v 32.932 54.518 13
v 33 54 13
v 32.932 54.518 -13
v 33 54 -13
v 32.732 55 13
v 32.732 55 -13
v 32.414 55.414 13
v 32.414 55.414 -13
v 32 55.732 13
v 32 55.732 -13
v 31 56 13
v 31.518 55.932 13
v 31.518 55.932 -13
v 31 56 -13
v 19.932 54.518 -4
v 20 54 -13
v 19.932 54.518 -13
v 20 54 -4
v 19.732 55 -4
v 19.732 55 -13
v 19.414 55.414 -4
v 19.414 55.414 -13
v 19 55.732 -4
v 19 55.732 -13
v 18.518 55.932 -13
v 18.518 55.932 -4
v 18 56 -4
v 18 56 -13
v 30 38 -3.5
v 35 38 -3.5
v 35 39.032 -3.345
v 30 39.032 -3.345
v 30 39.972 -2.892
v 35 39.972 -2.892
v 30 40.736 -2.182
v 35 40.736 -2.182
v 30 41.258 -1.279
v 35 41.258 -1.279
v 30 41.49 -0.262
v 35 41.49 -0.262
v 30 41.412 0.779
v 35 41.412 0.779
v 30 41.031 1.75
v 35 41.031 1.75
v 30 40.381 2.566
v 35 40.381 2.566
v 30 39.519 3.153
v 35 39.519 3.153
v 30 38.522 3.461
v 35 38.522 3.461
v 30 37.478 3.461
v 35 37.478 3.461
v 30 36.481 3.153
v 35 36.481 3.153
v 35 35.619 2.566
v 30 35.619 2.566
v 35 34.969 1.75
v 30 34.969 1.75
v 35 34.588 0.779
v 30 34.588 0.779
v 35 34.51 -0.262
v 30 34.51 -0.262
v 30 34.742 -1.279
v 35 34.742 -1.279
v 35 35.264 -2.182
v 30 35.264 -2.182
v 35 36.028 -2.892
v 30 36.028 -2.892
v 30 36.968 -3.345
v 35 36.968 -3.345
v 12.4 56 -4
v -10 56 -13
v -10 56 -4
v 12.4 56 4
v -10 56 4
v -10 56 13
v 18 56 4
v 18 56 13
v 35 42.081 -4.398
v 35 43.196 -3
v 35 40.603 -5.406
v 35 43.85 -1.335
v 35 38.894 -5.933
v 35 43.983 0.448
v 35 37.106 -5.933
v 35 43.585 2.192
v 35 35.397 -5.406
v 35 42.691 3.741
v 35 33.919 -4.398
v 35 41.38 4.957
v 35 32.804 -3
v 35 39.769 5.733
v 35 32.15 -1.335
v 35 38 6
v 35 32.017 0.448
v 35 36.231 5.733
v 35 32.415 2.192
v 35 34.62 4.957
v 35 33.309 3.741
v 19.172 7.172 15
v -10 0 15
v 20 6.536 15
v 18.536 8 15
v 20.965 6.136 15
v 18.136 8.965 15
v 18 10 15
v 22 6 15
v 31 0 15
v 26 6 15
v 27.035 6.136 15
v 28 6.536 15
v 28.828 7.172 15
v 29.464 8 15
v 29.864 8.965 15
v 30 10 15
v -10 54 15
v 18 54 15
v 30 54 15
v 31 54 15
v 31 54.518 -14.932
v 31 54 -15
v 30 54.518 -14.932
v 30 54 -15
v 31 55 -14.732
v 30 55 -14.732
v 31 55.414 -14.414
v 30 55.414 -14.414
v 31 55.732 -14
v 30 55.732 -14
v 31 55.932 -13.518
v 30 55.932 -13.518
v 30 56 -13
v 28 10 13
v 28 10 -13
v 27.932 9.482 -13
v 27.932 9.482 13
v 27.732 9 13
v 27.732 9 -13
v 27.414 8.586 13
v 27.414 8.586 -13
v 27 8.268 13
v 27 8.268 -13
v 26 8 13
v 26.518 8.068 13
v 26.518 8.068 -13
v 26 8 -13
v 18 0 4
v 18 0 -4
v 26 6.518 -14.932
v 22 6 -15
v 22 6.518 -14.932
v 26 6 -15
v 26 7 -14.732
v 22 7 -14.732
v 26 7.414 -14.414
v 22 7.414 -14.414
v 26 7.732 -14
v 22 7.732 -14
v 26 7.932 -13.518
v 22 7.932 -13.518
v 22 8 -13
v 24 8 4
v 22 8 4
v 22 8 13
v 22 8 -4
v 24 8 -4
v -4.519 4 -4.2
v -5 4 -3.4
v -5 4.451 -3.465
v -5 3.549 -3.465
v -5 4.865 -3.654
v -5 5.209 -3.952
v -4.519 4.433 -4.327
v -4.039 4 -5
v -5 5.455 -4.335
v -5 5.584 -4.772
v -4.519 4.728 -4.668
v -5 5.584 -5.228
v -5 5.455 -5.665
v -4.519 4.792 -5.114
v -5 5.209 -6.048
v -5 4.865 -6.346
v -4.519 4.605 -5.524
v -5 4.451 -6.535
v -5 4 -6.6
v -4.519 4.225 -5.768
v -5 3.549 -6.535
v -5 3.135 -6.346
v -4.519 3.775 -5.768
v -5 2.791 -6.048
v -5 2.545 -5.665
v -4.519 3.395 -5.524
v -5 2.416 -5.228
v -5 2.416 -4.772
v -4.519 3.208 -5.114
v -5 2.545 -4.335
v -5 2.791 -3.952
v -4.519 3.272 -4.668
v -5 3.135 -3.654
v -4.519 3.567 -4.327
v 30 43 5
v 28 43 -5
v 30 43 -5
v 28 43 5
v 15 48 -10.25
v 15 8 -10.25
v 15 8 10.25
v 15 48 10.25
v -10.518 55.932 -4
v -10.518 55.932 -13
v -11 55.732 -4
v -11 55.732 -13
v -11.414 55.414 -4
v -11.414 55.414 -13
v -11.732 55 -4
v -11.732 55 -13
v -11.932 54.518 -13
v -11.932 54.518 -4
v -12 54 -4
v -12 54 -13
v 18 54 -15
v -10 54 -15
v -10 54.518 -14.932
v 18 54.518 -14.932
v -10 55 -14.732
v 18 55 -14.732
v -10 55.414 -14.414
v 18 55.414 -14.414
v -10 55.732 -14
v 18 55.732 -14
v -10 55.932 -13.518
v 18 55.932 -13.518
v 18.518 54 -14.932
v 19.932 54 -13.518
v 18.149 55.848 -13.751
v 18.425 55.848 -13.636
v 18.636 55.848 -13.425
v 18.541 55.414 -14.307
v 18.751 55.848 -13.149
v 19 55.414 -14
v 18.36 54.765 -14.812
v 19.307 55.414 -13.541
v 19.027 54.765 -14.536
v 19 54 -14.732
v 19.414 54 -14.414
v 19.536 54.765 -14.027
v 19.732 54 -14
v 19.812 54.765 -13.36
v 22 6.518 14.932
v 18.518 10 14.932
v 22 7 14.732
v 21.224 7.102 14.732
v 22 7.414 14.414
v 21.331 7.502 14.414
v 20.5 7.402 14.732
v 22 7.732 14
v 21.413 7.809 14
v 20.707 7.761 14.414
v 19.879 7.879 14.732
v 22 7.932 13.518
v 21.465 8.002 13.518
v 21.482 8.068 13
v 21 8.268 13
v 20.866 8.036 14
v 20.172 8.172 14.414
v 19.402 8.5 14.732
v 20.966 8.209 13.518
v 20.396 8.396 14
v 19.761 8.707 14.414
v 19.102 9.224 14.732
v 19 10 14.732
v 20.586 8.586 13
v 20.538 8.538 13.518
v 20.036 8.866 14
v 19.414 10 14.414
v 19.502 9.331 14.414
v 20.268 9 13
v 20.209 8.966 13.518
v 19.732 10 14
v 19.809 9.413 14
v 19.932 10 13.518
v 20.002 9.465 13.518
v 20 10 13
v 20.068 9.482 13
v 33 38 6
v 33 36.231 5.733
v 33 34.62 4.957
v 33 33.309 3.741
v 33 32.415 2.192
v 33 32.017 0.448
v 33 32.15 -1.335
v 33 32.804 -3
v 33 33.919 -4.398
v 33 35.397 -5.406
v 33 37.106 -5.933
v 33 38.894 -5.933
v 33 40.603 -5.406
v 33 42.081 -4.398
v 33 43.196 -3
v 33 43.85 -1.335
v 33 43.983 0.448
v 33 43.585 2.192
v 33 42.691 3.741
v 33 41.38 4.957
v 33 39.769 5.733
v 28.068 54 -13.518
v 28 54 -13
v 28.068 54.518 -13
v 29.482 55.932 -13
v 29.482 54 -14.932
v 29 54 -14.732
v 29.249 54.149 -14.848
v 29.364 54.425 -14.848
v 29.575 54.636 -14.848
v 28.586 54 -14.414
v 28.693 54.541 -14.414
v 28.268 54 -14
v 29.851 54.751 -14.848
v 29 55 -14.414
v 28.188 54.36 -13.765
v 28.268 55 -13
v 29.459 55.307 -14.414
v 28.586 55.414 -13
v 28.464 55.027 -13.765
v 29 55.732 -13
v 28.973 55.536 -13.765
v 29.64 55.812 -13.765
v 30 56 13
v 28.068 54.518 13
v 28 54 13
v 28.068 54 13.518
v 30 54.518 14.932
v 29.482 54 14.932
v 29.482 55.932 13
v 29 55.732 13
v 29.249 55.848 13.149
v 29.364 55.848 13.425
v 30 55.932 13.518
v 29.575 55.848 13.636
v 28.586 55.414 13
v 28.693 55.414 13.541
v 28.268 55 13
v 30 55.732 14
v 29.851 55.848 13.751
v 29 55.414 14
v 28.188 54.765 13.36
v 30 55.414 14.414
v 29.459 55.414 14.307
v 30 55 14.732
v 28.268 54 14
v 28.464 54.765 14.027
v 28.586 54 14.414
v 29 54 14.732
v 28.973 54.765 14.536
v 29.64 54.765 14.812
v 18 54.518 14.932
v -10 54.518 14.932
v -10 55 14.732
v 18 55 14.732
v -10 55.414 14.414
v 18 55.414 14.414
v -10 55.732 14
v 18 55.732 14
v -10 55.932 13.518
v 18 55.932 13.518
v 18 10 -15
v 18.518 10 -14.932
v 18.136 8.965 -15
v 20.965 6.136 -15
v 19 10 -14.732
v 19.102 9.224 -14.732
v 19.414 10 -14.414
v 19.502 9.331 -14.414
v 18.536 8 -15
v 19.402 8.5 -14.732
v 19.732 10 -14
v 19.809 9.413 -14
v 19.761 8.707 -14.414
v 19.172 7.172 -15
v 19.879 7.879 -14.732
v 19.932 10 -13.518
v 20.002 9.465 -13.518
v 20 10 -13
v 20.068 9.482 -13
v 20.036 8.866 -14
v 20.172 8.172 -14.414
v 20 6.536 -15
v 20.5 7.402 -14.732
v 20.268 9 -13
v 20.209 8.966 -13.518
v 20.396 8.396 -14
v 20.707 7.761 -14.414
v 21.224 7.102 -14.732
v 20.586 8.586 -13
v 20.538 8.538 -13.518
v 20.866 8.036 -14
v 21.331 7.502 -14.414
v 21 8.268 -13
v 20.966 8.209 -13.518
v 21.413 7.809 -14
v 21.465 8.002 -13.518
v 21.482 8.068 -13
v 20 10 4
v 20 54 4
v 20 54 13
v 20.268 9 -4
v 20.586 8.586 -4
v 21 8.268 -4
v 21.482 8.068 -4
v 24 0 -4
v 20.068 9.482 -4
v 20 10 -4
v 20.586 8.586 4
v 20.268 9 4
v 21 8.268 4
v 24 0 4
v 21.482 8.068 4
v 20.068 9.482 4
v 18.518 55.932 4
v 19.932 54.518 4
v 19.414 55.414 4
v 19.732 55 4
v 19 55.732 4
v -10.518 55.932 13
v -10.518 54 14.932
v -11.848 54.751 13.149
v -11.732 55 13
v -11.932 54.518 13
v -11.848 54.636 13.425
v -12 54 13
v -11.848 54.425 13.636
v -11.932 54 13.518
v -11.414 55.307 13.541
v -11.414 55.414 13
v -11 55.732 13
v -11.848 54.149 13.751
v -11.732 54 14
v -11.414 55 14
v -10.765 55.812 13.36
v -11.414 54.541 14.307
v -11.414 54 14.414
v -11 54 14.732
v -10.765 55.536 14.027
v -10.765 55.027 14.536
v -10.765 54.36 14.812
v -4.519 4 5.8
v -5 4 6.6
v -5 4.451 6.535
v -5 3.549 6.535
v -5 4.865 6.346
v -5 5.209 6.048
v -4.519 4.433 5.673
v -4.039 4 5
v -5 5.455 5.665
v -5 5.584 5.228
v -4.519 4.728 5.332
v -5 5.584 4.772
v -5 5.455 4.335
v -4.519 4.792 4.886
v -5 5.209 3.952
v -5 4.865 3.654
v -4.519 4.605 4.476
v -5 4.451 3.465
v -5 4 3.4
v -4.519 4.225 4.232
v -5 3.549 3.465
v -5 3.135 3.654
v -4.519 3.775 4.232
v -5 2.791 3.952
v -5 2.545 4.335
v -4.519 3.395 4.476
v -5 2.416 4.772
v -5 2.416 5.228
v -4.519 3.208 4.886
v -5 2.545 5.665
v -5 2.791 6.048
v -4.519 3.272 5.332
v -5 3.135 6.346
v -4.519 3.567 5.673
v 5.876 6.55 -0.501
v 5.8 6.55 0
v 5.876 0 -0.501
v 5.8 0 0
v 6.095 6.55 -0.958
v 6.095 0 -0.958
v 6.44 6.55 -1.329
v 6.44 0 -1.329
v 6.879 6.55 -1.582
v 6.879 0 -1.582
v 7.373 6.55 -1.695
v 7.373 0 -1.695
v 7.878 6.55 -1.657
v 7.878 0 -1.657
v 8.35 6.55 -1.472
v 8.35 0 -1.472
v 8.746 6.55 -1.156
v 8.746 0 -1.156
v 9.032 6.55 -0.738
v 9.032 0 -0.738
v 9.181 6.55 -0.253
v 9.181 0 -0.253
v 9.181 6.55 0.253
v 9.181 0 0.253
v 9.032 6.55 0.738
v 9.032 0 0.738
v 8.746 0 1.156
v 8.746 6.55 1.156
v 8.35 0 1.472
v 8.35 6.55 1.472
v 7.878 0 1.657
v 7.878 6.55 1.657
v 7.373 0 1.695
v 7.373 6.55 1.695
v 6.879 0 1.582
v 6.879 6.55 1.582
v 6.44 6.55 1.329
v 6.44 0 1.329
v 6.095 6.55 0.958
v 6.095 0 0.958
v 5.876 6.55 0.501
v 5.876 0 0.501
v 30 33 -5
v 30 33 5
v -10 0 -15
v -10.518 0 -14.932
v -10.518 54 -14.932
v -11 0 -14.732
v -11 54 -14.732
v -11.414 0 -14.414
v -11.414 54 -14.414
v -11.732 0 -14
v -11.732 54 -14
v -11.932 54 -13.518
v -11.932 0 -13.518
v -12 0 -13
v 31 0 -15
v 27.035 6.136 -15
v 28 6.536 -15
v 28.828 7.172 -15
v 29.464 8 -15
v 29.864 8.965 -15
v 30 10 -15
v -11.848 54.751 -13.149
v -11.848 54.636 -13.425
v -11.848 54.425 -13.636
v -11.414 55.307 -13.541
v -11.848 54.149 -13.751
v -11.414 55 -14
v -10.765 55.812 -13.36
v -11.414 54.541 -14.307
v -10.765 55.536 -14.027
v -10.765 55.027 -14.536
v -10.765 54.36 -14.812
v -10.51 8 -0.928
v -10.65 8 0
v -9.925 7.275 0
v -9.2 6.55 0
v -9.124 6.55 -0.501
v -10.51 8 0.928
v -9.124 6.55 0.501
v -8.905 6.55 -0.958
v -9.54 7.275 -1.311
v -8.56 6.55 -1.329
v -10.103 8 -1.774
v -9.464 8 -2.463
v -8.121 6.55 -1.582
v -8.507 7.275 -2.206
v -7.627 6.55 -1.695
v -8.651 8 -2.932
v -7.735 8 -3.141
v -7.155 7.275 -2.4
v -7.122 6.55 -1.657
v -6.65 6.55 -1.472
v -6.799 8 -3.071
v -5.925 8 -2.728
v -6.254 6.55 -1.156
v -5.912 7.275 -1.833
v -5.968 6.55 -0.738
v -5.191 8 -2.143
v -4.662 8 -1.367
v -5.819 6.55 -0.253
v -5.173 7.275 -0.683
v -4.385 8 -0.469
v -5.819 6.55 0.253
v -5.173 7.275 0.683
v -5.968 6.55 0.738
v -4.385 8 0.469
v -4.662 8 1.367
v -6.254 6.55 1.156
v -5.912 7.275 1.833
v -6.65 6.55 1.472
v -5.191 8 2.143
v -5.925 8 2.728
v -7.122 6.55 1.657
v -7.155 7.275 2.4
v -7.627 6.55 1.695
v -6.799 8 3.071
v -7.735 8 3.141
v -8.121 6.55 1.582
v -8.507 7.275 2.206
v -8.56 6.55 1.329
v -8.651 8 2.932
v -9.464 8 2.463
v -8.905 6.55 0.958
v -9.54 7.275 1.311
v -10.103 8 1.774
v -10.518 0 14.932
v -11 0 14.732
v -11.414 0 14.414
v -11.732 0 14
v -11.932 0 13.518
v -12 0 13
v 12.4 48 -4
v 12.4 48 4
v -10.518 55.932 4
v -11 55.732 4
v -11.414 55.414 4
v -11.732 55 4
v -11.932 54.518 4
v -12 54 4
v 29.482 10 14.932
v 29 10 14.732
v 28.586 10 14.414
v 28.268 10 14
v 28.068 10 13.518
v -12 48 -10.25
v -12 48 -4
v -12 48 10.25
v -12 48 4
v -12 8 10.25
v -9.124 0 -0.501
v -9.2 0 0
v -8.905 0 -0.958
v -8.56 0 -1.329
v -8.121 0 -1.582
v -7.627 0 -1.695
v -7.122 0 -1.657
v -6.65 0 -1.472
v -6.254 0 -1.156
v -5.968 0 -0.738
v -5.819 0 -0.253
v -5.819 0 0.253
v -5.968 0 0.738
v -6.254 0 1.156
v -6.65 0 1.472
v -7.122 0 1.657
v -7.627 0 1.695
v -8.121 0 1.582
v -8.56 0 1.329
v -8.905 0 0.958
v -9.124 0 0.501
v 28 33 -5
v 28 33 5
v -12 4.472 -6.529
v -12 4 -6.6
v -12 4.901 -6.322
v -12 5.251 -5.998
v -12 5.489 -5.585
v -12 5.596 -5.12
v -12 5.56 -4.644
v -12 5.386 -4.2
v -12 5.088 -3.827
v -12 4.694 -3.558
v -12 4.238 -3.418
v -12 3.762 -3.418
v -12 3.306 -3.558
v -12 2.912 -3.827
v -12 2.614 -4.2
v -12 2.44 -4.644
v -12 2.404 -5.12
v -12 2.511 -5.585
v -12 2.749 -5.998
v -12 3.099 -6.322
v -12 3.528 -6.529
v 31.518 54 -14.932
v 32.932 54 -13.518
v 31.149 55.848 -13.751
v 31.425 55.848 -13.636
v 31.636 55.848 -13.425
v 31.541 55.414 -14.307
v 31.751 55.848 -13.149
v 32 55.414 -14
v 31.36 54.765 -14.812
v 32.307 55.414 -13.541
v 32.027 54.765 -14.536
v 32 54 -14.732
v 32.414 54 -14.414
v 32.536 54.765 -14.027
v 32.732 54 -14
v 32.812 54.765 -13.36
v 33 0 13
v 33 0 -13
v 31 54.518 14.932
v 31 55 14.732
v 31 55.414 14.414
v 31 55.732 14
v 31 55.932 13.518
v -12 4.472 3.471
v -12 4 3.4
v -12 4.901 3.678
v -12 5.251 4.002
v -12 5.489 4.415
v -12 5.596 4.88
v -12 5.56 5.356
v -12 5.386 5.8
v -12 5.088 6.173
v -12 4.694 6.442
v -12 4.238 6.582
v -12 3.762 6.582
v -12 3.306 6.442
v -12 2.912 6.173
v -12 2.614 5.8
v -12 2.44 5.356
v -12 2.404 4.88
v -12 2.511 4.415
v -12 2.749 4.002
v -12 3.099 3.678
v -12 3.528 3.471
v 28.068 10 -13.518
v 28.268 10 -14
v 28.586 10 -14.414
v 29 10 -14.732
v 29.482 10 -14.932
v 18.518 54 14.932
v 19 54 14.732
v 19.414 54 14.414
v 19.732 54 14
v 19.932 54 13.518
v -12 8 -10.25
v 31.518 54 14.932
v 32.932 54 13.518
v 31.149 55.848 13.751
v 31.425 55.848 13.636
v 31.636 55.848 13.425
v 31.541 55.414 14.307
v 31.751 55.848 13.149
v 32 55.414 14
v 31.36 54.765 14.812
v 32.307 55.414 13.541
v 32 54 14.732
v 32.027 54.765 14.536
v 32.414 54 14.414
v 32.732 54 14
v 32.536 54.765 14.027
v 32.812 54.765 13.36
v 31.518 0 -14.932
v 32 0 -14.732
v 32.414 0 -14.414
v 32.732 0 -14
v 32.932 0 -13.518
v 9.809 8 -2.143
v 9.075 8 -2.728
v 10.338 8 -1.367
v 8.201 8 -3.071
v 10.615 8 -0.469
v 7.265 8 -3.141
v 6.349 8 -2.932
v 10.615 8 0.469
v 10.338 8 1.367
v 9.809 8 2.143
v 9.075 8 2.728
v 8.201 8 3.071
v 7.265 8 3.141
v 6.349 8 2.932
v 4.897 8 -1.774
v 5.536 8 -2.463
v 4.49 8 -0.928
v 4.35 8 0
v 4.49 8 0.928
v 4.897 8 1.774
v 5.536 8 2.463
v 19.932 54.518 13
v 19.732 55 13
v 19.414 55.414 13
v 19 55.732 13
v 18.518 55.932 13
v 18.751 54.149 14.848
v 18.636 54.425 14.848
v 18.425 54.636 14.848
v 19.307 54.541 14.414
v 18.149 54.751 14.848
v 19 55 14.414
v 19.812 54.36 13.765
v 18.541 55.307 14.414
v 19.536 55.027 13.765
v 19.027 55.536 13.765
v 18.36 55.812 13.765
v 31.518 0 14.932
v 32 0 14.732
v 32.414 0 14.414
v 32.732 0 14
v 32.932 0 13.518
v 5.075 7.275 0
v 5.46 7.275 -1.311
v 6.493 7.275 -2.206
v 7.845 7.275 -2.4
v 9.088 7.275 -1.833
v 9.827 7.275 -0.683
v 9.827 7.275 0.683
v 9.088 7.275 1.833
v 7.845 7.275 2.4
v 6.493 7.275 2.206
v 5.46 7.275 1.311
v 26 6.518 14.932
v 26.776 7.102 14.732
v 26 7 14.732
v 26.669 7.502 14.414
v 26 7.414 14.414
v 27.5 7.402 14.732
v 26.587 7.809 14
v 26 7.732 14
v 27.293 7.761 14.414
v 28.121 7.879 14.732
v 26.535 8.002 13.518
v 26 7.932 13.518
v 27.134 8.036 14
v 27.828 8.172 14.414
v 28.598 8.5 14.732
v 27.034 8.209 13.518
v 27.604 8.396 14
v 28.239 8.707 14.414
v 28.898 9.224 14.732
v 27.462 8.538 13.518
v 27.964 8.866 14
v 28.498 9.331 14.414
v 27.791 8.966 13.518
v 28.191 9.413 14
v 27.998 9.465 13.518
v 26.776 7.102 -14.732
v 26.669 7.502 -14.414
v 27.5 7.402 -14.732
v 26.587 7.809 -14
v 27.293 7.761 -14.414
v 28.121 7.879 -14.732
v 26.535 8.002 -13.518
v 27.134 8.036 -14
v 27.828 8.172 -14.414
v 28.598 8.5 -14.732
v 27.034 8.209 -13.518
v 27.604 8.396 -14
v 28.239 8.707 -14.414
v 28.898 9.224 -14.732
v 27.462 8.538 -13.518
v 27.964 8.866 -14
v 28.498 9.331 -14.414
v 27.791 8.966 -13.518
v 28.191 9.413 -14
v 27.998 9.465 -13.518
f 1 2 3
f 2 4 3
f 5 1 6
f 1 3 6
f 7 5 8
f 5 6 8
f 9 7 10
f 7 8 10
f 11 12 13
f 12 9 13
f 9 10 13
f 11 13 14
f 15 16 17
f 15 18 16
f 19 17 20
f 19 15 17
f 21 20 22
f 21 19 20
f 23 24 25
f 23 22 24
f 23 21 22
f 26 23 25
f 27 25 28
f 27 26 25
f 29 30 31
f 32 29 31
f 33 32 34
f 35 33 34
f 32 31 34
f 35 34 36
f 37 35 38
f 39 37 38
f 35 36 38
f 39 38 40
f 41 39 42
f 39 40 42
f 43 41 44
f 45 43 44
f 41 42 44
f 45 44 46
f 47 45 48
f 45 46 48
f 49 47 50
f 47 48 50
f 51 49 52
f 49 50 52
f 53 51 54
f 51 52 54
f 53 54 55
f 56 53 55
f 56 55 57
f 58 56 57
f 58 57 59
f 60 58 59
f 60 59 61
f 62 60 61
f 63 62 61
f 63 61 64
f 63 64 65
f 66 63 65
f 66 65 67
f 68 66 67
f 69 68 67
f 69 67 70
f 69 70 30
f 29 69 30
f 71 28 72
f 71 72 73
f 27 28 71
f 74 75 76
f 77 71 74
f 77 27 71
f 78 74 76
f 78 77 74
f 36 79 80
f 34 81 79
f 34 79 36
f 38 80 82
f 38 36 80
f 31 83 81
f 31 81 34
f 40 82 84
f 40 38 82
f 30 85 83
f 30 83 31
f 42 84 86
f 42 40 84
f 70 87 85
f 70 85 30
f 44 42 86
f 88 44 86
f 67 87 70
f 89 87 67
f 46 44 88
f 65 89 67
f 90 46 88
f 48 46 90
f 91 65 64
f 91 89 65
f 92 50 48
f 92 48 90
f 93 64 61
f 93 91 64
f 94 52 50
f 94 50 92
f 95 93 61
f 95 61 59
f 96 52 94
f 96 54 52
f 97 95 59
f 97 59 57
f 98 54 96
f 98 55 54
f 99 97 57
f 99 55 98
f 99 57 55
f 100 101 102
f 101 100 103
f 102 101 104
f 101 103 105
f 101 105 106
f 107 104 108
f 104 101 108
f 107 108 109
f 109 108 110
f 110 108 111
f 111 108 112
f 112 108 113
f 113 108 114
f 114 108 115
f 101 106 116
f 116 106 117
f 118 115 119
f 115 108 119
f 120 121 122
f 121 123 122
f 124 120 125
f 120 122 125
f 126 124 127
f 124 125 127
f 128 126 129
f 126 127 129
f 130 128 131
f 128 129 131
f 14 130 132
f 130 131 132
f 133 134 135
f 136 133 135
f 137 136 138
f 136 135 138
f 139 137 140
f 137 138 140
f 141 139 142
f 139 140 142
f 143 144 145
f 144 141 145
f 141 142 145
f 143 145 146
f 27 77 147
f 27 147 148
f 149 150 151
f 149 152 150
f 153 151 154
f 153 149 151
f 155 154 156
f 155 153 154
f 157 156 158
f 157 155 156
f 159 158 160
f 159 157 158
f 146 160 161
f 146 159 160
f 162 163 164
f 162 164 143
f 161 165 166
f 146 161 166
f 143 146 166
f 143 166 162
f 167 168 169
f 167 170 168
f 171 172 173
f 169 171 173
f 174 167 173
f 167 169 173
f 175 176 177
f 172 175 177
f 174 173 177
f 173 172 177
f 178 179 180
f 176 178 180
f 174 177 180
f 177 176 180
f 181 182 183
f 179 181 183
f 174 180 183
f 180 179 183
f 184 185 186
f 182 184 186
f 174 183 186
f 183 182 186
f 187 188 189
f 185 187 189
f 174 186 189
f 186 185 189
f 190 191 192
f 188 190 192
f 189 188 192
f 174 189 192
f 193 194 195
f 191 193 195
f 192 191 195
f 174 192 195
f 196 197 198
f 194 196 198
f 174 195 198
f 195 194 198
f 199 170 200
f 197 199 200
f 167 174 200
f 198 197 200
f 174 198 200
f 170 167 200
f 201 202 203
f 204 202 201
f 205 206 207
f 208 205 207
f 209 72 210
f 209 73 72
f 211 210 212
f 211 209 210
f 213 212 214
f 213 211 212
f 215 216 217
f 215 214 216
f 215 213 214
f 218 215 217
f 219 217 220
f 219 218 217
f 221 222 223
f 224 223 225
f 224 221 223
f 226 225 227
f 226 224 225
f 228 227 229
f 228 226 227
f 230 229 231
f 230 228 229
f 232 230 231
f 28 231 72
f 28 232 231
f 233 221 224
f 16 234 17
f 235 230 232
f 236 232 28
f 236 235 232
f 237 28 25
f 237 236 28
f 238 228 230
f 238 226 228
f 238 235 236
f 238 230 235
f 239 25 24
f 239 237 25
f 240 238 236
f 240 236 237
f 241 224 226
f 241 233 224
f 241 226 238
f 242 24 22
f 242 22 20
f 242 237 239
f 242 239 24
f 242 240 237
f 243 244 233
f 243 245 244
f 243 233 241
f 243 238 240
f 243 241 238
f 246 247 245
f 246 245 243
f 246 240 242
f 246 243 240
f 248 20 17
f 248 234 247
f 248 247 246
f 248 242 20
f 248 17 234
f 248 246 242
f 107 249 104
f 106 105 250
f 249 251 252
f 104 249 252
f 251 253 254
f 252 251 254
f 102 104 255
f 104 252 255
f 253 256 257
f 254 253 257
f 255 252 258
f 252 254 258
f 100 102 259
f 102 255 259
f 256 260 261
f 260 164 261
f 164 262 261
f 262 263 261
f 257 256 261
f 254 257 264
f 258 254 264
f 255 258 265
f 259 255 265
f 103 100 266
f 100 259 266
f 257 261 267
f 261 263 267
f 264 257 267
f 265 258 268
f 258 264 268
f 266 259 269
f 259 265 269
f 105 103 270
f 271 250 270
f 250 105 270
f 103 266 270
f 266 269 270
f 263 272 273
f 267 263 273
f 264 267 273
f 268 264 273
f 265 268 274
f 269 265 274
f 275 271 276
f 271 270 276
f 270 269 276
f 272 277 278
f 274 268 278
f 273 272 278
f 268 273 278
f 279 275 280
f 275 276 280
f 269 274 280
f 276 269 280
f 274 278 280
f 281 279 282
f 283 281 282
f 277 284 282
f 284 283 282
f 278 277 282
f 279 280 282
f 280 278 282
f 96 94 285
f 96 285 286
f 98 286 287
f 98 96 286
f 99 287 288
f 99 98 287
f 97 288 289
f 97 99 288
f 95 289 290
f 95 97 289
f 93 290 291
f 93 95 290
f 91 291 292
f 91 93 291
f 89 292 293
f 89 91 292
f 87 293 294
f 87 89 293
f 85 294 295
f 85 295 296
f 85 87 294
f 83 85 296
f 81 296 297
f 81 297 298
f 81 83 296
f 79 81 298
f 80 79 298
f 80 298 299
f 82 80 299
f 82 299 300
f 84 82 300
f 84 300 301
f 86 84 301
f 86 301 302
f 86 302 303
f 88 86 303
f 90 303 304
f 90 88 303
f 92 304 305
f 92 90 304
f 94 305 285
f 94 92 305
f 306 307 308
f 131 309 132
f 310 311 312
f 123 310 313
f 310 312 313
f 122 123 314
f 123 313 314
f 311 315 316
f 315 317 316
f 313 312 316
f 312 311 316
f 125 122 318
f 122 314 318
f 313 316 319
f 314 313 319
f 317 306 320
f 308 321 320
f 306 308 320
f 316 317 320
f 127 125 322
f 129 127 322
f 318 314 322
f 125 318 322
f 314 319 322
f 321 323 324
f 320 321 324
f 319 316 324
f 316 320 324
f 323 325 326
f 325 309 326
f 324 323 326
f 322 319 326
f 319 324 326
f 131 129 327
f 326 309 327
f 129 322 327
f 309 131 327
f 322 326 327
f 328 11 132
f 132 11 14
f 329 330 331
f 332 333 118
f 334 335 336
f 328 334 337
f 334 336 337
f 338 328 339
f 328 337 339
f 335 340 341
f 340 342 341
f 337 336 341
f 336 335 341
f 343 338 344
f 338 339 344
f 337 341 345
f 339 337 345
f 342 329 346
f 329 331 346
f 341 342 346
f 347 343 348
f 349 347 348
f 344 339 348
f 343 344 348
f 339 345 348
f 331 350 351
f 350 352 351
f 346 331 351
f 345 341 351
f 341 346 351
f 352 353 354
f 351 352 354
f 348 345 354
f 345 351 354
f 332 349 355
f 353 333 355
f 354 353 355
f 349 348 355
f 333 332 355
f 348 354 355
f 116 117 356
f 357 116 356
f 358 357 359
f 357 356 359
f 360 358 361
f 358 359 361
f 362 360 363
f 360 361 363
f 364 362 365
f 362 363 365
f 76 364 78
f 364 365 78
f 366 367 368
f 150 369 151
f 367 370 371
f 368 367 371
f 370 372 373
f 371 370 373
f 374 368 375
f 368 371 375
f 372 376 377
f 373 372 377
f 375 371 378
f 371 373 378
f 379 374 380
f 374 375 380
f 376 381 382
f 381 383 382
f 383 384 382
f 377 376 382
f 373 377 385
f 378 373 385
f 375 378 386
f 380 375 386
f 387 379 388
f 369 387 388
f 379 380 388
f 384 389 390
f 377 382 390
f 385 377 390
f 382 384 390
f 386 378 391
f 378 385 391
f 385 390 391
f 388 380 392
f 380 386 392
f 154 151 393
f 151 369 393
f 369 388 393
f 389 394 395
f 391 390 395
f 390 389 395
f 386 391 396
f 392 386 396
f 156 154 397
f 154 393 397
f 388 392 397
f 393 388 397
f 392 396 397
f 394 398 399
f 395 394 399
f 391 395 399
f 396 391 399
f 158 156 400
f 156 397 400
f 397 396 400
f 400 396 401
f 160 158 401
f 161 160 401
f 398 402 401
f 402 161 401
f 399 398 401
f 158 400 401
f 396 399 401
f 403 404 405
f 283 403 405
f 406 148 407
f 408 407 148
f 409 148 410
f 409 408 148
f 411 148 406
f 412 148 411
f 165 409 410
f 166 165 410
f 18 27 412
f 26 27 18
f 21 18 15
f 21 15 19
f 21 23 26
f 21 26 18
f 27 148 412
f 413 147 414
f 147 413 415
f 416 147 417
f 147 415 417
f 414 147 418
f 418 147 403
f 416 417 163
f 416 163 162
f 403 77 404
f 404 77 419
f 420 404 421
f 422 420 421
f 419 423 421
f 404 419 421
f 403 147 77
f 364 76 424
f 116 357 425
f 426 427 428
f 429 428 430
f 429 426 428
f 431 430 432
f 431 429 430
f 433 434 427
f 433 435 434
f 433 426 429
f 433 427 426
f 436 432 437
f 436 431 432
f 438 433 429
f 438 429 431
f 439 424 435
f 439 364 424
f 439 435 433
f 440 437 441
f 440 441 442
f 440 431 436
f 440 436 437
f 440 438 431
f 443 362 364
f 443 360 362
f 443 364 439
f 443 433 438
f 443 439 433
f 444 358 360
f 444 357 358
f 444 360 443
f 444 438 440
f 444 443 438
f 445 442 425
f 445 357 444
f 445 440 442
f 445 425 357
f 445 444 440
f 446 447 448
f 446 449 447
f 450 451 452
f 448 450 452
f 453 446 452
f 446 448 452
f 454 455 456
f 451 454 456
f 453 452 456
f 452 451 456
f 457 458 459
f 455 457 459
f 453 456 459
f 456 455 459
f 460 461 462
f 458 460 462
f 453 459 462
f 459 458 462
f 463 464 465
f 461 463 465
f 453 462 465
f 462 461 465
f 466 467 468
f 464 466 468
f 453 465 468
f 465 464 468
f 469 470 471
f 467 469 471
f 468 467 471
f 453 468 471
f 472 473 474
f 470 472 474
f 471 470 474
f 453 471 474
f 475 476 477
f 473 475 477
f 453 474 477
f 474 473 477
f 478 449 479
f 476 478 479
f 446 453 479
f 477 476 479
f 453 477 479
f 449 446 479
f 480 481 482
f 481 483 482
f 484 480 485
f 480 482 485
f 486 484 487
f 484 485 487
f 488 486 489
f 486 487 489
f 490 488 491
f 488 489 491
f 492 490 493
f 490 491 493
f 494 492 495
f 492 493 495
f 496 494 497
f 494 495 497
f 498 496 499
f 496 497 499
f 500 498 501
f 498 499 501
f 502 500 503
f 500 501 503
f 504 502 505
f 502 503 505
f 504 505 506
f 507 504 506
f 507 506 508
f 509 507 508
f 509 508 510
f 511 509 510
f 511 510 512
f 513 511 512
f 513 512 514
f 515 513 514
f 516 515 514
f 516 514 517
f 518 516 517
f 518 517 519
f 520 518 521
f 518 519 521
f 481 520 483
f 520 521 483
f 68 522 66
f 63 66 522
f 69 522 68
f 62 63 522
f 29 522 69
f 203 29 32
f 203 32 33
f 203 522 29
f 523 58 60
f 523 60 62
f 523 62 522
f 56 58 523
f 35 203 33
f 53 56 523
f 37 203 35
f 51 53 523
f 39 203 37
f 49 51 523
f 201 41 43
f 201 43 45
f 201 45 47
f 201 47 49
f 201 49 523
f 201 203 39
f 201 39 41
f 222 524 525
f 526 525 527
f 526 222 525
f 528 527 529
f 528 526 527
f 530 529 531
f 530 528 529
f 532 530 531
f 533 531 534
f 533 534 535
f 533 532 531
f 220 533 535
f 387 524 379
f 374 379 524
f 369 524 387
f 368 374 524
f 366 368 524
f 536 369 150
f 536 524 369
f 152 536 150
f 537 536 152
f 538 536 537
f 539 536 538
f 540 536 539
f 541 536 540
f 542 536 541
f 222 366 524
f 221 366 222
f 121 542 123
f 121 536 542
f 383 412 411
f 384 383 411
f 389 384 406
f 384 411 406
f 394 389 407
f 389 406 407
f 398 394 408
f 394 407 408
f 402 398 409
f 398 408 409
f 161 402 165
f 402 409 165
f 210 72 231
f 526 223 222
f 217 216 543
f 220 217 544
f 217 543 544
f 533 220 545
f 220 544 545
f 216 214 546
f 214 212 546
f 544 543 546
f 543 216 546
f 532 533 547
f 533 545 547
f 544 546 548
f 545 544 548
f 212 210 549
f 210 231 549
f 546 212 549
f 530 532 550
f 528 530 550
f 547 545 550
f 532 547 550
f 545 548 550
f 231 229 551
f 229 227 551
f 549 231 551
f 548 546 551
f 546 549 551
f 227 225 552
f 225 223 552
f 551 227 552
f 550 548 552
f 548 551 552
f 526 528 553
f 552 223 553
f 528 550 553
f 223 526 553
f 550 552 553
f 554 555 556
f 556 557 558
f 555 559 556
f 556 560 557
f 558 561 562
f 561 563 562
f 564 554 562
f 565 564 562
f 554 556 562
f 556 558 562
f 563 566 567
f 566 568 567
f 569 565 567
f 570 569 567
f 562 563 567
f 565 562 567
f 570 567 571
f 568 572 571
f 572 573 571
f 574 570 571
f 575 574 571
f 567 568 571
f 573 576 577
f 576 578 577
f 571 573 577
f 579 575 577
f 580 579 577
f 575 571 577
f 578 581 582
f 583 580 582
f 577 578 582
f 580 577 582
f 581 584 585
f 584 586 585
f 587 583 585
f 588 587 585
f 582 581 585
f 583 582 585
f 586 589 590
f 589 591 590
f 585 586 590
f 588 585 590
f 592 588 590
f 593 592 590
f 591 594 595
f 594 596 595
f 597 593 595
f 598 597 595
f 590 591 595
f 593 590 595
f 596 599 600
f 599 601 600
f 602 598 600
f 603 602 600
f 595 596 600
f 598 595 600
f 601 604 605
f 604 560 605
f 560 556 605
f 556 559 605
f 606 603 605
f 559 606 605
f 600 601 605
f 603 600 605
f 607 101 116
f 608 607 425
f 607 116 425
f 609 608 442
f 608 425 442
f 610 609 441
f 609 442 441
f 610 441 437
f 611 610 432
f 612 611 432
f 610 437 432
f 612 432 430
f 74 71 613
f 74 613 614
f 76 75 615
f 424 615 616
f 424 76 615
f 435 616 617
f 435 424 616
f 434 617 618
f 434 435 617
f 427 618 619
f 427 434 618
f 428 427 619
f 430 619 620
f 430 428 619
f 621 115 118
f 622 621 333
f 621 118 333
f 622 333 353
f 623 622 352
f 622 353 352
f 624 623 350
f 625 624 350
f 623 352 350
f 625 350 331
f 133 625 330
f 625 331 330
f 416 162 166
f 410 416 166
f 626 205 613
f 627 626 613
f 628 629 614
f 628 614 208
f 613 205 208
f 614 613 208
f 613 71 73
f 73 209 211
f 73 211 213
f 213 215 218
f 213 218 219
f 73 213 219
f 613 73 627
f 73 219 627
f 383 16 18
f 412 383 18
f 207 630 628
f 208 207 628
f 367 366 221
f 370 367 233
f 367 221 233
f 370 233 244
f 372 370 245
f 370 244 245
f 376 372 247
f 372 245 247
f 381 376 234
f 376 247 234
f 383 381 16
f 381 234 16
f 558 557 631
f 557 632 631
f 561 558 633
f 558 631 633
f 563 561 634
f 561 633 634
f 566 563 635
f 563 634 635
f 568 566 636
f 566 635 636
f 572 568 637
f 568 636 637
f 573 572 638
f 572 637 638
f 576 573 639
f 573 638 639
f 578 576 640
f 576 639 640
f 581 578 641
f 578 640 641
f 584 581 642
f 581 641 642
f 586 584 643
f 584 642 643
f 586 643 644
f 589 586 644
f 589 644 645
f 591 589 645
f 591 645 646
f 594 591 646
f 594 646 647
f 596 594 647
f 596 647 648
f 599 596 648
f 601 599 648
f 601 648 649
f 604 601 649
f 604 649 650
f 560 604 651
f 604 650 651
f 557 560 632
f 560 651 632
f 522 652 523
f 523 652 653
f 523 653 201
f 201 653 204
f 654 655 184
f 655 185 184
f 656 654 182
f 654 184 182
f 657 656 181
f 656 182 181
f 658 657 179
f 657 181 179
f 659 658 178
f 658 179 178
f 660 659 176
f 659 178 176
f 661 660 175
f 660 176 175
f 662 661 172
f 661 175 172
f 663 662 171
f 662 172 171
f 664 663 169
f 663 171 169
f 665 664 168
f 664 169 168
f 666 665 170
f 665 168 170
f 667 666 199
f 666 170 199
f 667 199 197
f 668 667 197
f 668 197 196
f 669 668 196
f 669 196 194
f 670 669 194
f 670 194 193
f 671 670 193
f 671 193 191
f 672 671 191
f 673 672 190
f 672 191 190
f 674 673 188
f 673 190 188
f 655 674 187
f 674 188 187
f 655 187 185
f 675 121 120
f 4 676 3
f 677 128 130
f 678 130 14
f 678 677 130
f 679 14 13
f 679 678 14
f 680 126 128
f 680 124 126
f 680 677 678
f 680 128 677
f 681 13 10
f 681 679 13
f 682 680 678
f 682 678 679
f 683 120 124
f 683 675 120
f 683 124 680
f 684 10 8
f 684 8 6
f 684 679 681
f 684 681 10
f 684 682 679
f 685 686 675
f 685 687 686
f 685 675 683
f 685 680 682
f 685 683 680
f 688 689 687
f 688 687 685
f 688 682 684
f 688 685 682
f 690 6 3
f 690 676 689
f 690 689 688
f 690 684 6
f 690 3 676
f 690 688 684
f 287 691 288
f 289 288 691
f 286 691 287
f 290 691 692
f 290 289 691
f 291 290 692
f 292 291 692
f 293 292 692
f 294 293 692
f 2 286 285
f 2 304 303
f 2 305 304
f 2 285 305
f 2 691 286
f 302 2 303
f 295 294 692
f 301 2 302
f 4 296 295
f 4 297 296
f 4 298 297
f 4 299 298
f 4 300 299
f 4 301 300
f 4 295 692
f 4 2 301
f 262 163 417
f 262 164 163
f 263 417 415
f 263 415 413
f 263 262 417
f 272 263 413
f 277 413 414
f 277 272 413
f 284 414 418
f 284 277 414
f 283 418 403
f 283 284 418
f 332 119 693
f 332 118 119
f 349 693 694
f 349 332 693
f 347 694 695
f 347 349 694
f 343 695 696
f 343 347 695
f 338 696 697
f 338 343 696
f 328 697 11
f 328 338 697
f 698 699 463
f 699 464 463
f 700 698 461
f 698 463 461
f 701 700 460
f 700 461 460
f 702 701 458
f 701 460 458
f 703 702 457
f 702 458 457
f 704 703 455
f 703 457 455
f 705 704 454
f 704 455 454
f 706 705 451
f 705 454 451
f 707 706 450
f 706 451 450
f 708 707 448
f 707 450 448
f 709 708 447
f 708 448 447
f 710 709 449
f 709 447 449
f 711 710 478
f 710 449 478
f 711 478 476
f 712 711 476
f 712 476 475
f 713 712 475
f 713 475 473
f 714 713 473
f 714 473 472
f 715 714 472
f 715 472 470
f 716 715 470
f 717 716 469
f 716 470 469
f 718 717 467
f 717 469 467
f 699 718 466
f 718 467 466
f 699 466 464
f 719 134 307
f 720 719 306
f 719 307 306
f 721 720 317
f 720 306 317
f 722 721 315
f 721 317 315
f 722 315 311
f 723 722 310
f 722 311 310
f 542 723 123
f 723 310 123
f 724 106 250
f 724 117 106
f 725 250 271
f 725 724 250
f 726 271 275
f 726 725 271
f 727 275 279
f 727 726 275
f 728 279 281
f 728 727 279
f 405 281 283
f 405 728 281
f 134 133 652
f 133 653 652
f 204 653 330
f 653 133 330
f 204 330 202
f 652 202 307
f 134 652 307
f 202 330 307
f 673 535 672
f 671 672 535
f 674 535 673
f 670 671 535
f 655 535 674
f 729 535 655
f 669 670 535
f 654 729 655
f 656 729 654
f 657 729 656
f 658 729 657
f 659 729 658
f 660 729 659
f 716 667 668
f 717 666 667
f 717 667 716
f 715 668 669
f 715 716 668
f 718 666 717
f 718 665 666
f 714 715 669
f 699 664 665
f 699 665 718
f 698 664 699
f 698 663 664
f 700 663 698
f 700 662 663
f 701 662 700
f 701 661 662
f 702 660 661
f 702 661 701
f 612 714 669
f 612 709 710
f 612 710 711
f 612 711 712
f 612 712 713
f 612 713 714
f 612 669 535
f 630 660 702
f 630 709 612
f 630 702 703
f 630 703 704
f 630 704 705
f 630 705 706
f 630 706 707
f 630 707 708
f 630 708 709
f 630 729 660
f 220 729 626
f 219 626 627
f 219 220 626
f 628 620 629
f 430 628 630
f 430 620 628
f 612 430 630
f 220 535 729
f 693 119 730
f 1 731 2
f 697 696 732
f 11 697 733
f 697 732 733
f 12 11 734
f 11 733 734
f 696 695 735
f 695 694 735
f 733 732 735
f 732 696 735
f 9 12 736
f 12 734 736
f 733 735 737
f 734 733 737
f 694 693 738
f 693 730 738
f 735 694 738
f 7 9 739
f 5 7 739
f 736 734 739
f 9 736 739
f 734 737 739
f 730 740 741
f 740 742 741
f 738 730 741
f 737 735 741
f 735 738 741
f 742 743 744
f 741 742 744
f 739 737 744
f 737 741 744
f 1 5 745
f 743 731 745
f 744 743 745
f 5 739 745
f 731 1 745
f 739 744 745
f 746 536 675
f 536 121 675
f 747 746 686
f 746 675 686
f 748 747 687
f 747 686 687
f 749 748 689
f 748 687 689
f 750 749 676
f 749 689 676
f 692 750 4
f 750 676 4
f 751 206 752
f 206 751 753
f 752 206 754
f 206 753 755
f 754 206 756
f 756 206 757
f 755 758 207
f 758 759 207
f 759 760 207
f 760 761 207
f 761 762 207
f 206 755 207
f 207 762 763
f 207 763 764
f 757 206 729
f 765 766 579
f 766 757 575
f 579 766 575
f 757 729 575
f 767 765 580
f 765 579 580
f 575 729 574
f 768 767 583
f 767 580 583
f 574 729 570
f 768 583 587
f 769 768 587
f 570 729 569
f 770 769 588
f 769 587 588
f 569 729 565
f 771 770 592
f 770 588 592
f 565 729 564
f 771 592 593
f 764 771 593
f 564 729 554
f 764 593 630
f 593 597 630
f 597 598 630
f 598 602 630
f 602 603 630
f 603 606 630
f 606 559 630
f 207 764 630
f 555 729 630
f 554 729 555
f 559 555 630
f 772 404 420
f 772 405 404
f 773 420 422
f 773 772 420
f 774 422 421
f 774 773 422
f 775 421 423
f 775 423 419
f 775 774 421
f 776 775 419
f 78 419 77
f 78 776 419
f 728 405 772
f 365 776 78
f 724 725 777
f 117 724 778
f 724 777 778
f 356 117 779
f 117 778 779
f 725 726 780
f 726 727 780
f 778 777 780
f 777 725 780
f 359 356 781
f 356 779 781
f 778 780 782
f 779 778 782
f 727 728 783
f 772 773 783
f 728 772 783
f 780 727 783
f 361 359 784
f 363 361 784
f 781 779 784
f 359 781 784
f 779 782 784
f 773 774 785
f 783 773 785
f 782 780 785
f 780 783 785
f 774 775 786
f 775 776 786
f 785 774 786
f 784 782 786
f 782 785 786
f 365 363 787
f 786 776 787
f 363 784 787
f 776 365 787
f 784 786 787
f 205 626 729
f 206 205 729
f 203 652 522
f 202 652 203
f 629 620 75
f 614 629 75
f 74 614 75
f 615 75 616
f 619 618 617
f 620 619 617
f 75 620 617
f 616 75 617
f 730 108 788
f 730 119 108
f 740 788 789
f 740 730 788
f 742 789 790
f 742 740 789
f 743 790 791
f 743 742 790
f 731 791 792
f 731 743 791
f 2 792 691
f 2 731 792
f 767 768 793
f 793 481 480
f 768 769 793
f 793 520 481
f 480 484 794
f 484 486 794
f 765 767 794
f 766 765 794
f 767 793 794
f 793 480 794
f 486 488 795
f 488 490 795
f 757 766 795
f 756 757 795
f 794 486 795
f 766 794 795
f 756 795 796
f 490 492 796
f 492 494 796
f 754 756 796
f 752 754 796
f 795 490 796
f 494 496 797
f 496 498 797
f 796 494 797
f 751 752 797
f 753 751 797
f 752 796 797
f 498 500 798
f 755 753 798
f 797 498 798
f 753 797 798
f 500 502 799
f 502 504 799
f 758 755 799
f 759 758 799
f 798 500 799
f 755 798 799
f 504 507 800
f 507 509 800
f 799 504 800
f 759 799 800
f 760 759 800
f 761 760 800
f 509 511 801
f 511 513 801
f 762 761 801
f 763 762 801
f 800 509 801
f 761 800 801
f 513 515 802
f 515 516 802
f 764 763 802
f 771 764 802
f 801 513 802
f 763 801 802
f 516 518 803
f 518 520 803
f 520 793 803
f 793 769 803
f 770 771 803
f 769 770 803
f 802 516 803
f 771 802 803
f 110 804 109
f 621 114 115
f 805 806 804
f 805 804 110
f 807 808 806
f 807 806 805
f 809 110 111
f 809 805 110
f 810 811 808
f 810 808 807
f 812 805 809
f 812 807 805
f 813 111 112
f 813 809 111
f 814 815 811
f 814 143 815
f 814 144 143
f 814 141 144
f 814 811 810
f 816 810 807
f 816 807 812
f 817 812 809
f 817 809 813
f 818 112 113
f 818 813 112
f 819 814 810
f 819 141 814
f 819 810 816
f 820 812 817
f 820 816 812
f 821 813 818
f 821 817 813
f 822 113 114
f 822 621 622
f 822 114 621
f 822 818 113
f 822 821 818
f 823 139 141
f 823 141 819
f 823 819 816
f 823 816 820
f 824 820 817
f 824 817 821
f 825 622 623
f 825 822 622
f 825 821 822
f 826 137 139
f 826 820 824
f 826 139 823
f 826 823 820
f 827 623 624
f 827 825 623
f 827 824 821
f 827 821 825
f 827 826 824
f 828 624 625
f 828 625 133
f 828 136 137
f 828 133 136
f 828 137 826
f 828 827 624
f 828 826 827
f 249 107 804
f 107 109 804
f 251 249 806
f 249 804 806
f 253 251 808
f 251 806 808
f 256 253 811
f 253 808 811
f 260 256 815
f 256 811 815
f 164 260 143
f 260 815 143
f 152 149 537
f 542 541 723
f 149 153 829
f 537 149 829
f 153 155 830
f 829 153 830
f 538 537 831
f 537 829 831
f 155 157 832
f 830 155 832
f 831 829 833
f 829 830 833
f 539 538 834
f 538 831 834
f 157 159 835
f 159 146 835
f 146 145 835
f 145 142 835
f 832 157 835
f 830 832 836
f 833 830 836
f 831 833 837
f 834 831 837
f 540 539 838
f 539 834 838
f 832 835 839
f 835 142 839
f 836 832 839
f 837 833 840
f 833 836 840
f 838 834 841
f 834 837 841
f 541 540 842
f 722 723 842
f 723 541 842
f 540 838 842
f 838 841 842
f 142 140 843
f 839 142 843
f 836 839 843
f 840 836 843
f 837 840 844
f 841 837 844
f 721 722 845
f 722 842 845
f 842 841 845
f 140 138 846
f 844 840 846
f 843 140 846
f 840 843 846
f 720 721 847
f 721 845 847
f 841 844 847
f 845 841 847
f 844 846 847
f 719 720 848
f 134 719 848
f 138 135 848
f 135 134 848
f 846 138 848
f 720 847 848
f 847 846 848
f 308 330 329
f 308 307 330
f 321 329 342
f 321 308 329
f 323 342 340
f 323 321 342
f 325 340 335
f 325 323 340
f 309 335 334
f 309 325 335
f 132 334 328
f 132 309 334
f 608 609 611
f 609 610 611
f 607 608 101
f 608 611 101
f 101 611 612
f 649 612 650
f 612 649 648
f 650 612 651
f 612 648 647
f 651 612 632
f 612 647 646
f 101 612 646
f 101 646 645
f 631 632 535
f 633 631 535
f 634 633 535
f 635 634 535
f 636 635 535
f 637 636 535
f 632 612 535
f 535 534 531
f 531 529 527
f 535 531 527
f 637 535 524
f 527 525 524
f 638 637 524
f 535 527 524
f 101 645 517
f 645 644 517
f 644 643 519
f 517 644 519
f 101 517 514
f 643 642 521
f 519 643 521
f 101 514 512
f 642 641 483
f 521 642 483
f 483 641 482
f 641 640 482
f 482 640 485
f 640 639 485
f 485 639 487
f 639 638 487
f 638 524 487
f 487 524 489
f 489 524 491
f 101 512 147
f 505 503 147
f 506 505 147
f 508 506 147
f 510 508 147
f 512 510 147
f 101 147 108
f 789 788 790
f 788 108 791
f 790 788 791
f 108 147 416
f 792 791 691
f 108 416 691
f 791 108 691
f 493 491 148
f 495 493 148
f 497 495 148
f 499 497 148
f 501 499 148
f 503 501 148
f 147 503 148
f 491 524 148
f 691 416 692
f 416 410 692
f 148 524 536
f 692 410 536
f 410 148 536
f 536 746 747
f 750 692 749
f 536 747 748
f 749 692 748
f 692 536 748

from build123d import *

# Parameters (mm, degrees)
ESQUISSE1_W                                    = 45
ESQUISSE1_H                                    = 30
BOSS_EXTRU_1_DEPTH                             = 8
ESQUISSE5_W                                    = 30
ESQUISSE5_H                                    = 48
BOSS_EXTRU_3_DEPTH                             = 32
ENL_V_MAT_EXTRU_1_DEPTH                        = 27
ESQUISSE14_W                                   = 6
ESQUISSE14_H                                   = 8
ENL_V_MAT_EXTRU_2_DEPTH                        = 67.708320321
D_GAGEMENT_M31_D                               = 3.2
D_GAGEMENT_M31_DEPTH                           = 7
D_GAGEMENT_M31_TIP                             = 0.96137699
ESQUISSE16_W                                   = 30
ESQUISSE16_H                                   = 48
ESQUISSE16_R                                   = 3.5
BOSS_EXTRU_4_DEPTH                             = 5
CONG_1_R                                       = 2
ESQUISSE17_W                                   = 10
ESQUISSE17_H                                   = 10
ENL_V_MAT_EXTRU_3_DEPTH                        = 2
BOSS_EXTRU_5_START                             = 2
ESQUISSE18_R                                   = 6
ESQUISSE18_R_2                                 = 3.5
BOSS_EXTRU_5_DEPTH                             = 2
FRAISAGE_POUR_VIS_T_TE_FRAIS_E_M31_D           = 3.4
FRAISAGE_POUR_VIS_T_TE_FRAIS_E_M31_CSINK_D     = 6.3
FRAISAGE_POUR_VIS_T_TE_FRAIS_E_M31_CSINK_ANGLE = 90
ESQUISSE24_W                                   = 8
ESQUISSE24_H                                   = 8
BOSS_EXTRU_6_DEPTH                             = 2.6


with BuildPart() as part:
    # Esquisse1 → Boss.-Extru.1 (new body)
    with BuildSketch(Plane(origin=(0, 0, 0), x_dir=(1, 0, 0), z_dir=(0, 1, 0))):
        with Locations((10.5, 0)):
            Rectangle(ESQUISSE1_W, ESQUISSE1_H)
    extrude(amount=BOSS_EXTRU_1_DEPTH)

    # Esquisse5 → Boss.-Extru.3 (add)
    with BuildSketch(Plane.ZY.offset(12)):
        with Locations((0, 32)):
            Rectangle(ESQUISSE5_W, ESQUISSE5_H)
    extrude(amount=-BOSS_EXTRU_3_DEPTH)

    # Esquisse6 → Enlèv. mat.-Extru.1 (cut)
    with BuildSketch(Plane.ZY.offset(12)):
        Polygon((10.25, 48), (4, 48), (4, 56), (-4, 56), (-4, 48), (-10.25, 48), (-10.25, 8), (10.25, 8), align=None)
    extrude(amount=-ENL_V_MAT_EXTRU_1_DEPTH, mode=Mode.SUBTRACT)

    # Esquisse14 → Enlèv. mat.-Extru.2 (cut, through all)
    with BuildSketch(Plane(origin=(0, 56, 0), x_dir=(1, 0, 0), z_dir=(0, 1, 0))):
        with Locations((21, 0)):
            Rectangle(ESQUISSE14_W, ESQUISSE14_H)
    extrude(amount=-ENL_V_MAT_EXTRU_2_DEPTH, mode=Mode.SUBTRACT)

    # Dégagement M31
    with Locations(Plane.ZY.offset(12)):
        with Locations((5, 4), (-5, 4)):
            Hole(D_GAGEMENT_M31_D / 2, depth=D_GAGEMENT_M31_DEPTH)
            with Locations((0, 0, -(D_GAGEMENT_M31_DEPTH + D_GAGEMENT_M31_TIP / 2))):  # 118° drill point
                Cone(0, D_GAGEMENT_M31_D / 2, D_GAGEMENT_M31_TIP, mode=Mode.SUBTRACT)

    # Esquisse16 → Boss.-Extru.4 (add)
    with BuildSketch(Plane(origin=(33, 0, 0), x_dir=(0, 0, -1), z_dir=(1, 0, 0))):
        with Locations((0, 32)):
            Rectangle(ESQUISSE16_W, ESQUISSE16_H)
        with Locations((0, 38)):
            Circle(ESQUISSE16_R, mode=Mode.SUBTRACT)
    extrude(amount=-BOSS_EXTRU_4_DEPTH)

    # Congé1
    cong_1_edges = [part.edges().sort_by_distance(p)[0] for p in [
        (24, 8, -15),
        (24, 8, 15),
        (33, 28, 15),
        (33, 28, -15),
        (-12, 28, 15),
        (-12, 28, -15),
        (-12, 56, -9.5),
        (-12, 56, 9.5),
        (20, 8, -9.5),
        (20, 8, 9.5),
        (4, 56, -15),
        (20, 32, -15),
        (4, 56, 15),
        (20, 32, 15),
        (20, 56, -9.5),
        (20, 56, 9.5),
        (30.5, 56, 15),
        (28, 56, 0),
        (30.5, 56, -15),
        (33, 56, 0),
        (28, 8, 0),
        (28, 32, -15),
        (28, 32, 15),
    ]]
    fillet(cong_1_edges, radius=CONG_1_R)

    # Esquisse17 → Enlèv. mat.-Extru.3 (cut)
    with BuildSketch(Plane.ZY.offset(-28)):
        with Locations((0, 38)):
            Rectangle(ESQUISSE17_W, ESQUISSE17_H)
    extrude(amount=-ENL_V_MAT_EXTRU_3_DEPTH, mode=Mode.SUBTRACT)

    # Esquisse18 → Boss.-Extru.5 (add)
    with BuildSketch(Plane(origin=(33, 0, 0), x_dir=(0, 0, -1), z_dir=(1, 0, 0)).offset(BOSS_EXTRU_5_START)):
        with Locations((0, 38)):
            Circle(ESQUISSE18_R)
        with Locations((0, 38)):
            Circle(ESQUISSE18_R_2, mode=Mode.SUBTRACT)
    extrude(amount=-BOSS_EXTRU_5_DEPTH)

    # Fraisage pour vis à tête fraisée M31 (through all)
    with Locations(Plane(origin=(0, 8, 0), x_dir=(1, 0, 0), z_dir=(0, 1, 0))):
        with Locations((-7.5, 0), (7.5, 0)):
            CounterSinkHole(FRAISAGE_POUR_VIS_T_TE_FRAIS_E_M31_D / 2, FRAISAGE_POUR_VIS_T_TE_FRAIS_E_M31_CSINK_D / 2, counter_sink_angle=FRAISAGE_POUR_VIS_T_TE_FRAIS_E_M31_CSINK_ANGLE)

    # Esquisse24 → Boss.-Extru.6 (add)
    with BuildSketch(Plane.ZY.offset(-15)):
        with Locations((0, 52)):
            Rectangle(ESQUISSE24_W, ESQUISSE24_H)
    extrude(amount=BOSS_EXTRU_6_DEPTH)


solid = part.part
